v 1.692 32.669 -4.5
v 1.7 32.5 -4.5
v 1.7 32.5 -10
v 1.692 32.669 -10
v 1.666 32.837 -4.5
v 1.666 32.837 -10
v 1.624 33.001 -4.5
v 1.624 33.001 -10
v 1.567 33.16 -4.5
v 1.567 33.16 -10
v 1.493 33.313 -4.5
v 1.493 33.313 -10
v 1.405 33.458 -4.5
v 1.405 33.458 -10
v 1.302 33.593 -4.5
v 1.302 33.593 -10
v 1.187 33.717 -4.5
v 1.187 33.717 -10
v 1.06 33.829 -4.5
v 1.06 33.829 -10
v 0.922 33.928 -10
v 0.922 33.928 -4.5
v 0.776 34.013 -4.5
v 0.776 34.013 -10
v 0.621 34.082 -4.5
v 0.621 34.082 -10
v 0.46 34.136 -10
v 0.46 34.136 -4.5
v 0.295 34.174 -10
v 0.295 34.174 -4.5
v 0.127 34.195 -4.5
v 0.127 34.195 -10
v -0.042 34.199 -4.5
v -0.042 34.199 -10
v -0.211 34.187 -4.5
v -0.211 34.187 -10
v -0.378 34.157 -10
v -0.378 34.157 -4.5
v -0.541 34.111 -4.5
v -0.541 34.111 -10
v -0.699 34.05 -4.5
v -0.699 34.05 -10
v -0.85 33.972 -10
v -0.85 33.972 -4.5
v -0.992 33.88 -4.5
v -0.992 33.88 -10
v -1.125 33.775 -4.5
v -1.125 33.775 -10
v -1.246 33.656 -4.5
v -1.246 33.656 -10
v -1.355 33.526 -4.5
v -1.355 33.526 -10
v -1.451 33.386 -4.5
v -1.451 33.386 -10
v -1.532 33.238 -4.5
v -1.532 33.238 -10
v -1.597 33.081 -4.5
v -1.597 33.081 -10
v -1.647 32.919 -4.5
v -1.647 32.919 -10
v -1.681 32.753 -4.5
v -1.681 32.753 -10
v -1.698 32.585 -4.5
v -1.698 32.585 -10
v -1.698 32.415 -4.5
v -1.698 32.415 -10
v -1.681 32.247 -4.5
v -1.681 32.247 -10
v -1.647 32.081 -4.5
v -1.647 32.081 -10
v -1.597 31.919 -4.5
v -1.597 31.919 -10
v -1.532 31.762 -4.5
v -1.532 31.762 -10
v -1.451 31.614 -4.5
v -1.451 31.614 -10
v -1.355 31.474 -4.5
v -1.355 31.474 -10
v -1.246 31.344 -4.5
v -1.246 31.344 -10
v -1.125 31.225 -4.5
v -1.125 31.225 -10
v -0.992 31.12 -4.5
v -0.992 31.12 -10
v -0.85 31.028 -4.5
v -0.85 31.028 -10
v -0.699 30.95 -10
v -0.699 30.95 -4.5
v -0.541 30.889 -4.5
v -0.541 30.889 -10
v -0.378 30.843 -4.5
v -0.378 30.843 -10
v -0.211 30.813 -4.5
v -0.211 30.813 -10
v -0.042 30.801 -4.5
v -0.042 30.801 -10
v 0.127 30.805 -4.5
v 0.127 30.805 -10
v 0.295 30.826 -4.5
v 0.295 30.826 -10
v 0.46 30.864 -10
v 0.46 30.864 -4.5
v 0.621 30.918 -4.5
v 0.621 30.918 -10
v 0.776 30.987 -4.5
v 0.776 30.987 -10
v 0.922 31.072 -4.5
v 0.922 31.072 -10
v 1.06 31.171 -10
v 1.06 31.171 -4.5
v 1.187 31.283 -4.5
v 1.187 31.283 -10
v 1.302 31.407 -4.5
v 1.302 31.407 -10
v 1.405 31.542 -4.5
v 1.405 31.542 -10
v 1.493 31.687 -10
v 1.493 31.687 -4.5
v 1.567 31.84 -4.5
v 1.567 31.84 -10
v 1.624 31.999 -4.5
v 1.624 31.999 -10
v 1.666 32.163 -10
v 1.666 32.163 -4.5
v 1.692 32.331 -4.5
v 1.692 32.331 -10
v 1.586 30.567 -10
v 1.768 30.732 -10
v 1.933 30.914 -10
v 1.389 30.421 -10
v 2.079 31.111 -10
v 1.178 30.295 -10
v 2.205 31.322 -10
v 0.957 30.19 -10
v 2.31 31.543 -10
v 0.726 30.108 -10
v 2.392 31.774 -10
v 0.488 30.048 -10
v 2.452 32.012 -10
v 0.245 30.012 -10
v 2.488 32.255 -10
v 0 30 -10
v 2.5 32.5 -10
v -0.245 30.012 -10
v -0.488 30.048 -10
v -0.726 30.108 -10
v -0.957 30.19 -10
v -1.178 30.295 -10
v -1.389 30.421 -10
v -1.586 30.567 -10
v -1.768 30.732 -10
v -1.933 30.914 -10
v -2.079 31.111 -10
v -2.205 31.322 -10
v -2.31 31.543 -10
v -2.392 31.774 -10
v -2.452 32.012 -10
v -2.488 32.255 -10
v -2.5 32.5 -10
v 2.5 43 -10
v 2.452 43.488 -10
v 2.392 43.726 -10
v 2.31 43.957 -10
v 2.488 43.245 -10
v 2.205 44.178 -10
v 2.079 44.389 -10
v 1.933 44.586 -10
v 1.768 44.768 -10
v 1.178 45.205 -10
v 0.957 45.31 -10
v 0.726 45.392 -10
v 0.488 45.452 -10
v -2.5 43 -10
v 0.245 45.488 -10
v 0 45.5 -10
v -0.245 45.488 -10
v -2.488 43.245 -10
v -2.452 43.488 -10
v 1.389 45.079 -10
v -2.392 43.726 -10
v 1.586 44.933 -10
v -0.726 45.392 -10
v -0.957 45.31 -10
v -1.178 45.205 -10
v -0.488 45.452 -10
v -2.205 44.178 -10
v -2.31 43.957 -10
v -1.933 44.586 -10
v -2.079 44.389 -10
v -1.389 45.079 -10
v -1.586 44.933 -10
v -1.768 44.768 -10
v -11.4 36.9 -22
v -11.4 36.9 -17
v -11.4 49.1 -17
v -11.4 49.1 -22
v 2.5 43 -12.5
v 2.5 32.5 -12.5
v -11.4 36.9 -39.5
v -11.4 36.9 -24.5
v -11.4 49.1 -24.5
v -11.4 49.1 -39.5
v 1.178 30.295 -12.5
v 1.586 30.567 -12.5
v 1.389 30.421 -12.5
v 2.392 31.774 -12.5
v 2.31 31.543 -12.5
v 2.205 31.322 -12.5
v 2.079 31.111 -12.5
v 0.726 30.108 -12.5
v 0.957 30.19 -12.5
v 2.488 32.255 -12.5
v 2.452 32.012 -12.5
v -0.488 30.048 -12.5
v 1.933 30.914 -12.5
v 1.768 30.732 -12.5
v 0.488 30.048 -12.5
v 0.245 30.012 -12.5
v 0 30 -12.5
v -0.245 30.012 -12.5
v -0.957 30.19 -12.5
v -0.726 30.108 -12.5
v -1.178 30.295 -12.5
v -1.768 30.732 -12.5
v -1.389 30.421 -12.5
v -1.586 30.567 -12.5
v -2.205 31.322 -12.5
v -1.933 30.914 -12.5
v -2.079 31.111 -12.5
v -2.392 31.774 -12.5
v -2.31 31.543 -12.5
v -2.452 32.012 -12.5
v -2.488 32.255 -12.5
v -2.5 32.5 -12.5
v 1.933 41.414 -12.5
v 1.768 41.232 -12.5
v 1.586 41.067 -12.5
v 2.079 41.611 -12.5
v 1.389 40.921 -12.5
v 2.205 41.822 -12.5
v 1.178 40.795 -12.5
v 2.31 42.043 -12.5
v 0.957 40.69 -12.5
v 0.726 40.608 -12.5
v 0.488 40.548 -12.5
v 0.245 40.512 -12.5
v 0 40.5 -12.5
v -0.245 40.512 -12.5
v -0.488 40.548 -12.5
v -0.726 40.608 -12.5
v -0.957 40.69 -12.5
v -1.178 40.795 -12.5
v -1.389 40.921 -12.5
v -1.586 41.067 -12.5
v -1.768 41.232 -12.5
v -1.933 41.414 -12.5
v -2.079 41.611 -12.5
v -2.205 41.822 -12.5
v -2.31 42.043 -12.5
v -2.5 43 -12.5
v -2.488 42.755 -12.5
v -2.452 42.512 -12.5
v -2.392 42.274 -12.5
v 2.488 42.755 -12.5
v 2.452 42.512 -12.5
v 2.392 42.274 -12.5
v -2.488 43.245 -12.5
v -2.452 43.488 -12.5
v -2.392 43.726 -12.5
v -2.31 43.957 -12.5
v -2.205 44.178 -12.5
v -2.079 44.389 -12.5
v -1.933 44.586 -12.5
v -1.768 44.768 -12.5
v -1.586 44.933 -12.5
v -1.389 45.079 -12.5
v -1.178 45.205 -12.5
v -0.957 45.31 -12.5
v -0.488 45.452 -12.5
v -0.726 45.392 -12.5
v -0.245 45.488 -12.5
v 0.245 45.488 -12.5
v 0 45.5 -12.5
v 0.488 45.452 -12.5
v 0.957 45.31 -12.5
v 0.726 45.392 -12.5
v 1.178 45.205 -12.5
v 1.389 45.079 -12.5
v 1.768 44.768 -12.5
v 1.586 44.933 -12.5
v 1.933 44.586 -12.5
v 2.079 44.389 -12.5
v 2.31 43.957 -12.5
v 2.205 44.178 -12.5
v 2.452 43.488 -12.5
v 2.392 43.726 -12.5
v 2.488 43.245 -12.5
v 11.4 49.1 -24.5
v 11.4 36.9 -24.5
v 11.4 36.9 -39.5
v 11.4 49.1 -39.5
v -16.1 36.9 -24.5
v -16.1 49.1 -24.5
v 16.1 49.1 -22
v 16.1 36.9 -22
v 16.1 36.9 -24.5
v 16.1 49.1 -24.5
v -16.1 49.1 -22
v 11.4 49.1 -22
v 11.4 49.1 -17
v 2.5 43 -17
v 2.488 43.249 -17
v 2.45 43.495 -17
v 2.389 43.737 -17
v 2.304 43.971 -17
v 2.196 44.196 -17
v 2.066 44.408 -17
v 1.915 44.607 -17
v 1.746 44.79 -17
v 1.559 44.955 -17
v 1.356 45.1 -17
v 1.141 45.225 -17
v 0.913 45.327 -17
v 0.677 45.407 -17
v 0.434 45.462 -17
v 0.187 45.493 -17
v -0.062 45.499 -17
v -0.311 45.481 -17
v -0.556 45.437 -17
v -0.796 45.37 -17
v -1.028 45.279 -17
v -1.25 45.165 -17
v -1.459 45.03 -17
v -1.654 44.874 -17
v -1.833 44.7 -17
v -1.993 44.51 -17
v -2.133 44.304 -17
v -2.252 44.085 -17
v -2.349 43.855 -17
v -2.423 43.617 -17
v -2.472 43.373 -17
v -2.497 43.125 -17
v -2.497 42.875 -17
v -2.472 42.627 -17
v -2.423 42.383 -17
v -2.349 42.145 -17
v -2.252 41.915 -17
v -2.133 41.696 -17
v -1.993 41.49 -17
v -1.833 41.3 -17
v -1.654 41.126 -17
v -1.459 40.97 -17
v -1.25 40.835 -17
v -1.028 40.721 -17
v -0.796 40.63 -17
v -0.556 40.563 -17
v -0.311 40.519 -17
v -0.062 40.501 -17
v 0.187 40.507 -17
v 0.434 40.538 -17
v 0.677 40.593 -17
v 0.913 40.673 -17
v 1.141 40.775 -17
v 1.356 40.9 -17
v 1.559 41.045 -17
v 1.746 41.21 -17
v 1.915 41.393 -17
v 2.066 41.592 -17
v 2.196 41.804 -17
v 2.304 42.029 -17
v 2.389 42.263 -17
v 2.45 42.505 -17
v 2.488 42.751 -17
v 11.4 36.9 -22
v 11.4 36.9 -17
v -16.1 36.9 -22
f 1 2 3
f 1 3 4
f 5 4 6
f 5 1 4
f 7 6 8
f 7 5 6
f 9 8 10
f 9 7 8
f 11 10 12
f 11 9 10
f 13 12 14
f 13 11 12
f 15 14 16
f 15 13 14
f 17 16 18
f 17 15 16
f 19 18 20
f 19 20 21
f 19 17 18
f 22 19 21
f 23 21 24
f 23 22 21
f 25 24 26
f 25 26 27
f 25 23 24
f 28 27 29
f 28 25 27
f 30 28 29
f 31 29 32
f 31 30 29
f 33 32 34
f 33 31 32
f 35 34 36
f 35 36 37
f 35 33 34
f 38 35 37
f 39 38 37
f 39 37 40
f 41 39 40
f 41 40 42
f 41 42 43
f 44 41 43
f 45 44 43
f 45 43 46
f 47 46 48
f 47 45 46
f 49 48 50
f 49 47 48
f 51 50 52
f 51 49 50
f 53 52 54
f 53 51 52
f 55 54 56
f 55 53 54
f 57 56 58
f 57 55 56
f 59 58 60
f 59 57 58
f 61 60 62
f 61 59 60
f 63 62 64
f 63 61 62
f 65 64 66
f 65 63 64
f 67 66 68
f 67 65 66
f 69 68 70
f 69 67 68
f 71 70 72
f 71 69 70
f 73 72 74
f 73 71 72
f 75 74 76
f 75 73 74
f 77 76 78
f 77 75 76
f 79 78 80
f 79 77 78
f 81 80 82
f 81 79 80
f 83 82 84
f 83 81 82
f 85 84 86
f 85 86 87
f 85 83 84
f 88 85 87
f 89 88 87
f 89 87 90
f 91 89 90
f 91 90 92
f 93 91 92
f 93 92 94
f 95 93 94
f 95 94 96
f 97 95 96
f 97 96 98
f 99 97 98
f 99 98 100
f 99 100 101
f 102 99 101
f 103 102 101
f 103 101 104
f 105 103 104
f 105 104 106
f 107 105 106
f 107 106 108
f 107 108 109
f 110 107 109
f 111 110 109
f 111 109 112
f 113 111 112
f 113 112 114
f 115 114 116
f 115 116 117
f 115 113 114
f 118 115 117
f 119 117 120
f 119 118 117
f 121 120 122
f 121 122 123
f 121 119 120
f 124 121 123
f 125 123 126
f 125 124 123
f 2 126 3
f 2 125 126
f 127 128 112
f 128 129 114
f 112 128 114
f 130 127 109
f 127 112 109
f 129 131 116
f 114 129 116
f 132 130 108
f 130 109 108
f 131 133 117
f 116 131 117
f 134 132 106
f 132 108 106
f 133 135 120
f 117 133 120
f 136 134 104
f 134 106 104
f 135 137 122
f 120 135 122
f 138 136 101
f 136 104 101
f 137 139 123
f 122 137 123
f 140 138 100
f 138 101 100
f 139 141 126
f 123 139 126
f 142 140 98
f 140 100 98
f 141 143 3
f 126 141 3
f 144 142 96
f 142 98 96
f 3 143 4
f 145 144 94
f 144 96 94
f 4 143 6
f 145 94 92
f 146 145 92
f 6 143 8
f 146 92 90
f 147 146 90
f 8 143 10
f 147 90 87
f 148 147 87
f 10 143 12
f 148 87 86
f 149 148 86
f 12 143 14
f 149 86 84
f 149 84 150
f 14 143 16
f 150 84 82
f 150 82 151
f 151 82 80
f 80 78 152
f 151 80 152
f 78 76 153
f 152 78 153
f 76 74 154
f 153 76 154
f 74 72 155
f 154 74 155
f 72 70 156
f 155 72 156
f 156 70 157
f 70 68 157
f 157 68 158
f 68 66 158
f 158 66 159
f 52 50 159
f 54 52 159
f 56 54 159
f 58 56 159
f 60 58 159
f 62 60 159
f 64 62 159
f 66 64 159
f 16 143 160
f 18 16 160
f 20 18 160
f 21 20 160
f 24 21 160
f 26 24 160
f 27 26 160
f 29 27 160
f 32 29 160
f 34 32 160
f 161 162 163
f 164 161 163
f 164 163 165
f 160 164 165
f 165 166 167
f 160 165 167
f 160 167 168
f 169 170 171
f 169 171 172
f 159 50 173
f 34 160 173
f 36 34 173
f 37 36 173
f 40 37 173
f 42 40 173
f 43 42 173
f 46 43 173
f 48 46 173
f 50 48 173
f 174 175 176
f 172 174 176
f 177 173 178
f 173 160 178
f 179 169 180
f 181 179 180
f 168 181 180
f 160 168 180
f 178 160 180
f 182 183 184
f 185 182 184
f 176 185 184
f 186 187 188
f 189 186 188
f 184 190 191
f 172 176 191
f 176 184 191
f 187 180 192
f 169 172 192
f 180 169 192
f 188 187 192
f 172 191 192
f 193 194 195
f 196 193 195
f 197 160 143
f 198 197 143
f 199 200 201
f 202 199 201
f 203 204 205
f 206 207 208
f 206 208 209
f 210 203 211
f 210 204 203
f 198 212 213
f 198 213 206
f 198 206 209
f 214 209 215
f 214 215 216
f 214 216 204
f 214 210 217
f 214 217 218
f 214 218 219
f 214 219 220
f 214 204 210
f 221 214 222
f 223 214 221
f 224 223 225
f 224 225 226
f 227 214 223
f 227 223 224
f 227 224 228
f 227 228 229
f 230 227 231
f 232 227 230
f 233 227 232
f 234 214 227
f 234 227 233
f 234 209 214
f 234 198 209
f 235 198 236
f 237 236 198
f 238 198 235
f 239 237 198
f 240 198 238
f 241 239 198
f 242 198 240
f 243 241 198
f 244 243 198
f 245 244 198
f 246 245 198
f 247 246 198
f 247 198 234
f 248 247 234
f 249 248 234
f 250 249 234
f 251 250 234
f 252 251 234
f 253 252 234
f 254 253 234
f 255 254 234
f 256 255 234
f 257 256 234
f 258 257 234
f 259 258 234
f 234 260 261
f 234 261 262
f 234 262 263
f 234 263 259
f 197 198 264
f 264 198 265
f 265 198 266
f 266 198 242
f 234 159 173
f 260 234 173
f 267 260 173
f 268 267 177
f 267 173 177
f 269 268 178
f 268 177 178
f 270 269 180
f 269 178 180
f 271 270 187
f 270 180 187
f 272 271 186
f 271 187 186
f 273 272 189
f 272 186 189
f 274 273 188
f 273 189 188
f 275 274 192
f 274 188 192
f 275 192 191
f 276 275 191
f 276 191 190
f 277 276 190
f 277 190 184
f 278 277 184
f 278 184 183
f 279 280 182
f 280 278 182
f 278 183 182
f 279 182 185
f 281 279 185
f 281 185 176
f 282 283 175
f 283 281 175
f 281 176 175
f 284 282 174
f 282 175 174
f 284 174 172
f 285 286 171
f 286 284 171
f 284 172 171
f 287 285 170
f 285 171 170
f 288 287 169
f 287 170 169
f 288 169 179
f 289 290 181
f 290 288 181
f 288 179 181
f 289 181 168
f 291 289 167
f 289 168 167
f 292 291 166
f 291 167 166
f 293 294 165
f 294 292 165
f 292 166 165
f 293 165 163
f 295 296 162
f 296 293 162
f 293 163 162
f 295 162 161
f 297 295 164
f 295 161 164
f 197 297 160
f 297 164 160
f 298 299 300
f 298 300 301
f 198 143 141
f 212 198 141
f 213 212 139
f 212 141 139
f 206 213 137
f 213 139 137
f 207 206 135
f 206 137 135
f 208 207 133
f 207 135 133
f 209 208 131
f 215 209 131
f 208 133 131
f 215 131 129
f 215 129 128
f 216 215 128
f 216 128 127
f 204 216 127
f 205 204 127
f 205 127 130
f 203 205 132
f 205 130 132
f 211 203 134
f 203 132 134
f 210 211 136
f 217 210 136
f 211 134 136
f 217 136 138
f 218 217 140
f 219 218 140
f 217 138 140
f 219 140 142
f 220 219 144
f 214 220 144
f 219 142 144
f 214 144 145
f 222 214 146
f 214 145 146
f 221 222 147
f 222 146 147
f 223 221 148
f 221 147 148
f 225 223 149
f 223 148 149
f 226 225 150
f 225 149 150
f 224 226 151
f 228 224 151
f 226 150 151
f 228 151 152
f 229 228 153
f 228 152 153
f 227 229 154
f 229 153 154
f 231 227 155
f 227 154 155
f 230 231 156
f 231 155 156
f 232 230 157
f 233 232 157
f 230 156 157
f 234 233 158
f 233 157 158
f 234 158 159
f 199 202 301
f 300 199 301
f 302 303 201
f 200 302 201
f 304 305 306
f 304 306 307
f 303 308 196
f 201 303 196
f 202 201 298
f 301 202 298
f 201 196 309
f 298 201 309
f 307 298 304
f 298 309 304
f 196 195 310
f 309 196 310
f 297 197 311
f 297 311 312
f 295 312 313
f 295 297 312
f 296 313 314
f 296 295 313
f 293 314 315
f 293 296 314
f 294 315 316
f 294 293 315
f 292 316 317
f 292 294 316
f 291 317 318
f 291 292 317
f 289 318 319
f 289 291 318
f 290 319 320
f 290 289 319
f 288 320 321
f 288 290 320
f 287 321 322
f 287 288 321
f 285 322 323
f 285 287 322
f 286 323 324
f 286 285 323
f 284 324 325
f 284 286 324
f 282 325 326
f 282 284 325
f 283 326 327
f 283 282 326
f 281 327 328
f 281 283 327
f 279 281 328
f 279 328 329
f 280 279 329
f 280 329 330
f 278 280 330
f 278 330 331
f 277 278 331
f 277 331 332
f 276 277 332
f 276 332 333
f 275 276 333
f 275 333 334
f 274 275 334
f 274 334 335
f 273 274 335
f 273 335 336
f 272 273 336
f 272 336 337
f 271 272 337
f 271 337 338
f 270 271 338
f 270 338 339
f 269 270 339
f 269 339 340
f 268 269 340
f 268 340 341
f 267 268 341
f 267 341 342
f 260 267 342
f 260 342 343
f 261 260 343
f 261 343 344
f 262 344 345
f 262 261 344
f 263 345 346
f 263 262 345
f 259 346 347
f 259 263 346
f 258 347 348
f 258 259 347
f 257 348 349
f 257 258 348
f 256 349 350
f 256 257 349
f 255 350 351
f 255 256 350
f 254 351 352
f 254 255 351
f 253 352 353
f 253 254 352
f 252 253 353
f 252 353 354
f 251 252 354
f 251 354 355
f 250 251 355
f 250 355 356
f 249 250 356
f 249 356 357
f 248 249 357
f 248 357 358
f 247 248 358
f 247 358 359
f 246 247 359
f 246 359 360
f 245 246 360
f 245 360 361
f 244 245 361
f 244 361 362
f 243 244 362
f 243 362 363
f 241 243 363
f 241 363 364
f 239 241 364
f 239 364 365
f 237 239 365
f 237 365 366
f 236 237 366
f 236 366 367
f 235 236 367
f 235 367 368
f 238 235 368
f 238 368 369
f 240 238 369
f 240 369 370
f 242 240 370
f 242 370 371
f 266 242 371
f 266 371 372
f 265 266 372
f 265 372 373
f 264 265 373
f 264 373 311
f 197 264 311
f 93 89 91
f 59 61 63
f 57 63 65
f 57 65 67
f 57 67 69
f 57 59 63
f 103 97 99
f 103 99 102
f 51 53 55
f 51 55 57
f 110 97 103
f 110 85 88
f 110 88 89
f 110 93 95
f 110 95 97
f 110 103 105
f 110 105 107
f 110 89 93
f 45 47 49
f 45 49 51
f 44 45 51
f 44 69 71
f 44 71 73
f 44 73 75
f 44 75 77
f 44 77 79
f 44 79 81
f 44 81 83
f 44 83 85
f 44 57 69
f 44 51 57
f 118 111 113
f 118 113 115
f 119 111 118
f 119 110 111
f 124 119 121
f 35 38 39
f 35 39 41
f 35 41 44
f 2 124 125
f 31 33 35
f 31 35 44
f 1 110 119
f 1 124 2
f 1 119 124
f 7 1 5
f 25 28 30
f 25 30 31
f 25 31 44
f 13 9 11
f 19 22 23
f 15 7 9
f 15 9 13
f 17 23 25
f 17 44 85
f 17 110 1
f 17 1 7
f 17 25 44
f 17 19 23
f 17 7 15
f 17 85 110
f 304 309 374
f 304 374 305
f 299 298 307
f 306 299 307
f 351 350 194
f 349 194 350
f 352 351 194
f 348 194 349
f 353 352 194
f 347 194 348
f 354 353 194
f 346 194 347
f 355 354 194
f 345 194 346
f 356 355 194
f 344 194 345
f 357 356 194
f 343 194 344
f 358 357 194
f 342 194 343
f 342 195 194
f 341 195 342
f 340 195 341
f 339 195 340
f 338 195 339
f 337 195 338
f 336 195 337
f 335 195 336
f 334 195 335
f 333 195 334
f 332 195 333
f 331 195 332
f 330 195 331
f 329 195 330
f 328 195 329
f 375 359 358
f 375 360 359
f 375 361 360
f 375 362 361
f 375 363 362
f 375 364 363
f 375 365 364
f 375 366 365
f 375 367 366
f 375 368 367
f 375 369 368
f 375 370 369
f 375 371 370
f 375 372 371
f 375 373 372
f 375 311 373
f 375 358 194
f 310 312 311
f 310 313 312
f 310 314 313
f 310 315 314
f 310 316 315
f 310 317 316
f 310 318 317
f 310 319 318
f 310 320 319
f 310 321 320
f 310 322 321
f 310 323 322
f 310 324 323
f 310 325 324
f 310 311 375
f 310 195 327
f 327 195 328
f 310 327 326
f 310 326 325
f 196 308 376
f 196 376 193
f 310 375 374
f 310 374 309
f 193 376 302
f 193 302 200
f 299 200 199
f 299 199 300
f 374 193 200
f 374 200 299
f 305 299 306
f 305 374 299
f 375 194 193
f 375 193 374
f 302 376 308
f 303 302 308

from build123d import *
from build123d.topology import SkipClean

# Parameters (mm, degrees)
CORPS_SG90_START               = -17
ESQUISSE1_W                    = 22.8
ESQUISSE1_H                    = 12.2
CORPS_SG90_DEPTH               = 22.5
PATTES_FIXATION_START          = -22
ESQUISSE2_W                    = 32.2
ESQUISSE2_H                    = 12.2
PATTES_FIXATION_DEPTH          = 2.5
AXE_SERVO_START                = -12.5
ESQUISSE3_R                    = 2.5
AXE_SERVO_DEPTH                = 4.5
PALONNIER_POINT_MORT_BAS_START = -10
PALONNIER_POINT_MORT_BAS_DEPTH = 2.5
ERGOT_ENTRAINEMENT_START       = -4.5
ESQUISSE5_R                    = 1.7
ERGOT_ENTRAINEMENT_DEPTH       = 5.5


with BuildPart() as part:
    # Esquisse1 → Corps_SG90 (new body)
    with BuildSketch(Plane.XY.offset(CORPS_SG90_START)):
        with Locations((0, 43)):
            Rectangle(ESQUISSE1_W, ESQUISSE1_H)
    extrude(amount=-CORPS_SG90_DEPTH)

    # Esquisse2 → Pattes_fixation (add)
    with BuildSketch(Plane.XY.offset(PATTES_FIXATION_START)):
        with Locations((0, 43)):
            Rectangle(ESQUISSE2_W, ESQUISSE2_H)
    extrude(amount=-PATTES_FIXATION_DEPTH)

    # Esquisse3 → Axe_servo (add)
    with BuildSketch(Plane.XY.offset(AXE_SERVO_START)):
        with Locations((0, 43)):
            Circle(ESQUISSE3_R)
    extrude(amount=-AXE_SERVO_DEPTH)

    # Esquisse4 → Palonnier_point_mort_bas (add)
    with SkipClean():  # the faces are left unmerged after this step: merging them gives an invalid solid
        with BuildSketch(Plane.XY.offset(PALONNIER_POINT_MORT_BAS_START)):
            with BuildLine():
                Line((-2.5, 32.5), (-2.5, 43))
                ThreePointArc((-2.5, 43), (0, 45.5), (2.5, 43))
                Line((2.5, 43), (2.5, 32.5))
                ThreePointArc((2.5, 32.5), (0, 30), (-2.5, 32.5))
            make_face()
        extrude(amount=-PALONNIER_POINT_MORT_BAS_DEPTH)

    # Esquisse5 → Ergot_entrainement (add)
    with SkipClean():  # the faces are left unmerged after this step: merging them gives an invalid solid
        with BuildSketch(Plane.XY.offset(ERGOT_ENTRAINEMENT_START)):
            with Locations((0, 32.5)):
                Circle(ESQUISSE5_R)
        extrude(amount=-ERGOT_ENTRAINEMENT_DEPTH)


solid = part.part
